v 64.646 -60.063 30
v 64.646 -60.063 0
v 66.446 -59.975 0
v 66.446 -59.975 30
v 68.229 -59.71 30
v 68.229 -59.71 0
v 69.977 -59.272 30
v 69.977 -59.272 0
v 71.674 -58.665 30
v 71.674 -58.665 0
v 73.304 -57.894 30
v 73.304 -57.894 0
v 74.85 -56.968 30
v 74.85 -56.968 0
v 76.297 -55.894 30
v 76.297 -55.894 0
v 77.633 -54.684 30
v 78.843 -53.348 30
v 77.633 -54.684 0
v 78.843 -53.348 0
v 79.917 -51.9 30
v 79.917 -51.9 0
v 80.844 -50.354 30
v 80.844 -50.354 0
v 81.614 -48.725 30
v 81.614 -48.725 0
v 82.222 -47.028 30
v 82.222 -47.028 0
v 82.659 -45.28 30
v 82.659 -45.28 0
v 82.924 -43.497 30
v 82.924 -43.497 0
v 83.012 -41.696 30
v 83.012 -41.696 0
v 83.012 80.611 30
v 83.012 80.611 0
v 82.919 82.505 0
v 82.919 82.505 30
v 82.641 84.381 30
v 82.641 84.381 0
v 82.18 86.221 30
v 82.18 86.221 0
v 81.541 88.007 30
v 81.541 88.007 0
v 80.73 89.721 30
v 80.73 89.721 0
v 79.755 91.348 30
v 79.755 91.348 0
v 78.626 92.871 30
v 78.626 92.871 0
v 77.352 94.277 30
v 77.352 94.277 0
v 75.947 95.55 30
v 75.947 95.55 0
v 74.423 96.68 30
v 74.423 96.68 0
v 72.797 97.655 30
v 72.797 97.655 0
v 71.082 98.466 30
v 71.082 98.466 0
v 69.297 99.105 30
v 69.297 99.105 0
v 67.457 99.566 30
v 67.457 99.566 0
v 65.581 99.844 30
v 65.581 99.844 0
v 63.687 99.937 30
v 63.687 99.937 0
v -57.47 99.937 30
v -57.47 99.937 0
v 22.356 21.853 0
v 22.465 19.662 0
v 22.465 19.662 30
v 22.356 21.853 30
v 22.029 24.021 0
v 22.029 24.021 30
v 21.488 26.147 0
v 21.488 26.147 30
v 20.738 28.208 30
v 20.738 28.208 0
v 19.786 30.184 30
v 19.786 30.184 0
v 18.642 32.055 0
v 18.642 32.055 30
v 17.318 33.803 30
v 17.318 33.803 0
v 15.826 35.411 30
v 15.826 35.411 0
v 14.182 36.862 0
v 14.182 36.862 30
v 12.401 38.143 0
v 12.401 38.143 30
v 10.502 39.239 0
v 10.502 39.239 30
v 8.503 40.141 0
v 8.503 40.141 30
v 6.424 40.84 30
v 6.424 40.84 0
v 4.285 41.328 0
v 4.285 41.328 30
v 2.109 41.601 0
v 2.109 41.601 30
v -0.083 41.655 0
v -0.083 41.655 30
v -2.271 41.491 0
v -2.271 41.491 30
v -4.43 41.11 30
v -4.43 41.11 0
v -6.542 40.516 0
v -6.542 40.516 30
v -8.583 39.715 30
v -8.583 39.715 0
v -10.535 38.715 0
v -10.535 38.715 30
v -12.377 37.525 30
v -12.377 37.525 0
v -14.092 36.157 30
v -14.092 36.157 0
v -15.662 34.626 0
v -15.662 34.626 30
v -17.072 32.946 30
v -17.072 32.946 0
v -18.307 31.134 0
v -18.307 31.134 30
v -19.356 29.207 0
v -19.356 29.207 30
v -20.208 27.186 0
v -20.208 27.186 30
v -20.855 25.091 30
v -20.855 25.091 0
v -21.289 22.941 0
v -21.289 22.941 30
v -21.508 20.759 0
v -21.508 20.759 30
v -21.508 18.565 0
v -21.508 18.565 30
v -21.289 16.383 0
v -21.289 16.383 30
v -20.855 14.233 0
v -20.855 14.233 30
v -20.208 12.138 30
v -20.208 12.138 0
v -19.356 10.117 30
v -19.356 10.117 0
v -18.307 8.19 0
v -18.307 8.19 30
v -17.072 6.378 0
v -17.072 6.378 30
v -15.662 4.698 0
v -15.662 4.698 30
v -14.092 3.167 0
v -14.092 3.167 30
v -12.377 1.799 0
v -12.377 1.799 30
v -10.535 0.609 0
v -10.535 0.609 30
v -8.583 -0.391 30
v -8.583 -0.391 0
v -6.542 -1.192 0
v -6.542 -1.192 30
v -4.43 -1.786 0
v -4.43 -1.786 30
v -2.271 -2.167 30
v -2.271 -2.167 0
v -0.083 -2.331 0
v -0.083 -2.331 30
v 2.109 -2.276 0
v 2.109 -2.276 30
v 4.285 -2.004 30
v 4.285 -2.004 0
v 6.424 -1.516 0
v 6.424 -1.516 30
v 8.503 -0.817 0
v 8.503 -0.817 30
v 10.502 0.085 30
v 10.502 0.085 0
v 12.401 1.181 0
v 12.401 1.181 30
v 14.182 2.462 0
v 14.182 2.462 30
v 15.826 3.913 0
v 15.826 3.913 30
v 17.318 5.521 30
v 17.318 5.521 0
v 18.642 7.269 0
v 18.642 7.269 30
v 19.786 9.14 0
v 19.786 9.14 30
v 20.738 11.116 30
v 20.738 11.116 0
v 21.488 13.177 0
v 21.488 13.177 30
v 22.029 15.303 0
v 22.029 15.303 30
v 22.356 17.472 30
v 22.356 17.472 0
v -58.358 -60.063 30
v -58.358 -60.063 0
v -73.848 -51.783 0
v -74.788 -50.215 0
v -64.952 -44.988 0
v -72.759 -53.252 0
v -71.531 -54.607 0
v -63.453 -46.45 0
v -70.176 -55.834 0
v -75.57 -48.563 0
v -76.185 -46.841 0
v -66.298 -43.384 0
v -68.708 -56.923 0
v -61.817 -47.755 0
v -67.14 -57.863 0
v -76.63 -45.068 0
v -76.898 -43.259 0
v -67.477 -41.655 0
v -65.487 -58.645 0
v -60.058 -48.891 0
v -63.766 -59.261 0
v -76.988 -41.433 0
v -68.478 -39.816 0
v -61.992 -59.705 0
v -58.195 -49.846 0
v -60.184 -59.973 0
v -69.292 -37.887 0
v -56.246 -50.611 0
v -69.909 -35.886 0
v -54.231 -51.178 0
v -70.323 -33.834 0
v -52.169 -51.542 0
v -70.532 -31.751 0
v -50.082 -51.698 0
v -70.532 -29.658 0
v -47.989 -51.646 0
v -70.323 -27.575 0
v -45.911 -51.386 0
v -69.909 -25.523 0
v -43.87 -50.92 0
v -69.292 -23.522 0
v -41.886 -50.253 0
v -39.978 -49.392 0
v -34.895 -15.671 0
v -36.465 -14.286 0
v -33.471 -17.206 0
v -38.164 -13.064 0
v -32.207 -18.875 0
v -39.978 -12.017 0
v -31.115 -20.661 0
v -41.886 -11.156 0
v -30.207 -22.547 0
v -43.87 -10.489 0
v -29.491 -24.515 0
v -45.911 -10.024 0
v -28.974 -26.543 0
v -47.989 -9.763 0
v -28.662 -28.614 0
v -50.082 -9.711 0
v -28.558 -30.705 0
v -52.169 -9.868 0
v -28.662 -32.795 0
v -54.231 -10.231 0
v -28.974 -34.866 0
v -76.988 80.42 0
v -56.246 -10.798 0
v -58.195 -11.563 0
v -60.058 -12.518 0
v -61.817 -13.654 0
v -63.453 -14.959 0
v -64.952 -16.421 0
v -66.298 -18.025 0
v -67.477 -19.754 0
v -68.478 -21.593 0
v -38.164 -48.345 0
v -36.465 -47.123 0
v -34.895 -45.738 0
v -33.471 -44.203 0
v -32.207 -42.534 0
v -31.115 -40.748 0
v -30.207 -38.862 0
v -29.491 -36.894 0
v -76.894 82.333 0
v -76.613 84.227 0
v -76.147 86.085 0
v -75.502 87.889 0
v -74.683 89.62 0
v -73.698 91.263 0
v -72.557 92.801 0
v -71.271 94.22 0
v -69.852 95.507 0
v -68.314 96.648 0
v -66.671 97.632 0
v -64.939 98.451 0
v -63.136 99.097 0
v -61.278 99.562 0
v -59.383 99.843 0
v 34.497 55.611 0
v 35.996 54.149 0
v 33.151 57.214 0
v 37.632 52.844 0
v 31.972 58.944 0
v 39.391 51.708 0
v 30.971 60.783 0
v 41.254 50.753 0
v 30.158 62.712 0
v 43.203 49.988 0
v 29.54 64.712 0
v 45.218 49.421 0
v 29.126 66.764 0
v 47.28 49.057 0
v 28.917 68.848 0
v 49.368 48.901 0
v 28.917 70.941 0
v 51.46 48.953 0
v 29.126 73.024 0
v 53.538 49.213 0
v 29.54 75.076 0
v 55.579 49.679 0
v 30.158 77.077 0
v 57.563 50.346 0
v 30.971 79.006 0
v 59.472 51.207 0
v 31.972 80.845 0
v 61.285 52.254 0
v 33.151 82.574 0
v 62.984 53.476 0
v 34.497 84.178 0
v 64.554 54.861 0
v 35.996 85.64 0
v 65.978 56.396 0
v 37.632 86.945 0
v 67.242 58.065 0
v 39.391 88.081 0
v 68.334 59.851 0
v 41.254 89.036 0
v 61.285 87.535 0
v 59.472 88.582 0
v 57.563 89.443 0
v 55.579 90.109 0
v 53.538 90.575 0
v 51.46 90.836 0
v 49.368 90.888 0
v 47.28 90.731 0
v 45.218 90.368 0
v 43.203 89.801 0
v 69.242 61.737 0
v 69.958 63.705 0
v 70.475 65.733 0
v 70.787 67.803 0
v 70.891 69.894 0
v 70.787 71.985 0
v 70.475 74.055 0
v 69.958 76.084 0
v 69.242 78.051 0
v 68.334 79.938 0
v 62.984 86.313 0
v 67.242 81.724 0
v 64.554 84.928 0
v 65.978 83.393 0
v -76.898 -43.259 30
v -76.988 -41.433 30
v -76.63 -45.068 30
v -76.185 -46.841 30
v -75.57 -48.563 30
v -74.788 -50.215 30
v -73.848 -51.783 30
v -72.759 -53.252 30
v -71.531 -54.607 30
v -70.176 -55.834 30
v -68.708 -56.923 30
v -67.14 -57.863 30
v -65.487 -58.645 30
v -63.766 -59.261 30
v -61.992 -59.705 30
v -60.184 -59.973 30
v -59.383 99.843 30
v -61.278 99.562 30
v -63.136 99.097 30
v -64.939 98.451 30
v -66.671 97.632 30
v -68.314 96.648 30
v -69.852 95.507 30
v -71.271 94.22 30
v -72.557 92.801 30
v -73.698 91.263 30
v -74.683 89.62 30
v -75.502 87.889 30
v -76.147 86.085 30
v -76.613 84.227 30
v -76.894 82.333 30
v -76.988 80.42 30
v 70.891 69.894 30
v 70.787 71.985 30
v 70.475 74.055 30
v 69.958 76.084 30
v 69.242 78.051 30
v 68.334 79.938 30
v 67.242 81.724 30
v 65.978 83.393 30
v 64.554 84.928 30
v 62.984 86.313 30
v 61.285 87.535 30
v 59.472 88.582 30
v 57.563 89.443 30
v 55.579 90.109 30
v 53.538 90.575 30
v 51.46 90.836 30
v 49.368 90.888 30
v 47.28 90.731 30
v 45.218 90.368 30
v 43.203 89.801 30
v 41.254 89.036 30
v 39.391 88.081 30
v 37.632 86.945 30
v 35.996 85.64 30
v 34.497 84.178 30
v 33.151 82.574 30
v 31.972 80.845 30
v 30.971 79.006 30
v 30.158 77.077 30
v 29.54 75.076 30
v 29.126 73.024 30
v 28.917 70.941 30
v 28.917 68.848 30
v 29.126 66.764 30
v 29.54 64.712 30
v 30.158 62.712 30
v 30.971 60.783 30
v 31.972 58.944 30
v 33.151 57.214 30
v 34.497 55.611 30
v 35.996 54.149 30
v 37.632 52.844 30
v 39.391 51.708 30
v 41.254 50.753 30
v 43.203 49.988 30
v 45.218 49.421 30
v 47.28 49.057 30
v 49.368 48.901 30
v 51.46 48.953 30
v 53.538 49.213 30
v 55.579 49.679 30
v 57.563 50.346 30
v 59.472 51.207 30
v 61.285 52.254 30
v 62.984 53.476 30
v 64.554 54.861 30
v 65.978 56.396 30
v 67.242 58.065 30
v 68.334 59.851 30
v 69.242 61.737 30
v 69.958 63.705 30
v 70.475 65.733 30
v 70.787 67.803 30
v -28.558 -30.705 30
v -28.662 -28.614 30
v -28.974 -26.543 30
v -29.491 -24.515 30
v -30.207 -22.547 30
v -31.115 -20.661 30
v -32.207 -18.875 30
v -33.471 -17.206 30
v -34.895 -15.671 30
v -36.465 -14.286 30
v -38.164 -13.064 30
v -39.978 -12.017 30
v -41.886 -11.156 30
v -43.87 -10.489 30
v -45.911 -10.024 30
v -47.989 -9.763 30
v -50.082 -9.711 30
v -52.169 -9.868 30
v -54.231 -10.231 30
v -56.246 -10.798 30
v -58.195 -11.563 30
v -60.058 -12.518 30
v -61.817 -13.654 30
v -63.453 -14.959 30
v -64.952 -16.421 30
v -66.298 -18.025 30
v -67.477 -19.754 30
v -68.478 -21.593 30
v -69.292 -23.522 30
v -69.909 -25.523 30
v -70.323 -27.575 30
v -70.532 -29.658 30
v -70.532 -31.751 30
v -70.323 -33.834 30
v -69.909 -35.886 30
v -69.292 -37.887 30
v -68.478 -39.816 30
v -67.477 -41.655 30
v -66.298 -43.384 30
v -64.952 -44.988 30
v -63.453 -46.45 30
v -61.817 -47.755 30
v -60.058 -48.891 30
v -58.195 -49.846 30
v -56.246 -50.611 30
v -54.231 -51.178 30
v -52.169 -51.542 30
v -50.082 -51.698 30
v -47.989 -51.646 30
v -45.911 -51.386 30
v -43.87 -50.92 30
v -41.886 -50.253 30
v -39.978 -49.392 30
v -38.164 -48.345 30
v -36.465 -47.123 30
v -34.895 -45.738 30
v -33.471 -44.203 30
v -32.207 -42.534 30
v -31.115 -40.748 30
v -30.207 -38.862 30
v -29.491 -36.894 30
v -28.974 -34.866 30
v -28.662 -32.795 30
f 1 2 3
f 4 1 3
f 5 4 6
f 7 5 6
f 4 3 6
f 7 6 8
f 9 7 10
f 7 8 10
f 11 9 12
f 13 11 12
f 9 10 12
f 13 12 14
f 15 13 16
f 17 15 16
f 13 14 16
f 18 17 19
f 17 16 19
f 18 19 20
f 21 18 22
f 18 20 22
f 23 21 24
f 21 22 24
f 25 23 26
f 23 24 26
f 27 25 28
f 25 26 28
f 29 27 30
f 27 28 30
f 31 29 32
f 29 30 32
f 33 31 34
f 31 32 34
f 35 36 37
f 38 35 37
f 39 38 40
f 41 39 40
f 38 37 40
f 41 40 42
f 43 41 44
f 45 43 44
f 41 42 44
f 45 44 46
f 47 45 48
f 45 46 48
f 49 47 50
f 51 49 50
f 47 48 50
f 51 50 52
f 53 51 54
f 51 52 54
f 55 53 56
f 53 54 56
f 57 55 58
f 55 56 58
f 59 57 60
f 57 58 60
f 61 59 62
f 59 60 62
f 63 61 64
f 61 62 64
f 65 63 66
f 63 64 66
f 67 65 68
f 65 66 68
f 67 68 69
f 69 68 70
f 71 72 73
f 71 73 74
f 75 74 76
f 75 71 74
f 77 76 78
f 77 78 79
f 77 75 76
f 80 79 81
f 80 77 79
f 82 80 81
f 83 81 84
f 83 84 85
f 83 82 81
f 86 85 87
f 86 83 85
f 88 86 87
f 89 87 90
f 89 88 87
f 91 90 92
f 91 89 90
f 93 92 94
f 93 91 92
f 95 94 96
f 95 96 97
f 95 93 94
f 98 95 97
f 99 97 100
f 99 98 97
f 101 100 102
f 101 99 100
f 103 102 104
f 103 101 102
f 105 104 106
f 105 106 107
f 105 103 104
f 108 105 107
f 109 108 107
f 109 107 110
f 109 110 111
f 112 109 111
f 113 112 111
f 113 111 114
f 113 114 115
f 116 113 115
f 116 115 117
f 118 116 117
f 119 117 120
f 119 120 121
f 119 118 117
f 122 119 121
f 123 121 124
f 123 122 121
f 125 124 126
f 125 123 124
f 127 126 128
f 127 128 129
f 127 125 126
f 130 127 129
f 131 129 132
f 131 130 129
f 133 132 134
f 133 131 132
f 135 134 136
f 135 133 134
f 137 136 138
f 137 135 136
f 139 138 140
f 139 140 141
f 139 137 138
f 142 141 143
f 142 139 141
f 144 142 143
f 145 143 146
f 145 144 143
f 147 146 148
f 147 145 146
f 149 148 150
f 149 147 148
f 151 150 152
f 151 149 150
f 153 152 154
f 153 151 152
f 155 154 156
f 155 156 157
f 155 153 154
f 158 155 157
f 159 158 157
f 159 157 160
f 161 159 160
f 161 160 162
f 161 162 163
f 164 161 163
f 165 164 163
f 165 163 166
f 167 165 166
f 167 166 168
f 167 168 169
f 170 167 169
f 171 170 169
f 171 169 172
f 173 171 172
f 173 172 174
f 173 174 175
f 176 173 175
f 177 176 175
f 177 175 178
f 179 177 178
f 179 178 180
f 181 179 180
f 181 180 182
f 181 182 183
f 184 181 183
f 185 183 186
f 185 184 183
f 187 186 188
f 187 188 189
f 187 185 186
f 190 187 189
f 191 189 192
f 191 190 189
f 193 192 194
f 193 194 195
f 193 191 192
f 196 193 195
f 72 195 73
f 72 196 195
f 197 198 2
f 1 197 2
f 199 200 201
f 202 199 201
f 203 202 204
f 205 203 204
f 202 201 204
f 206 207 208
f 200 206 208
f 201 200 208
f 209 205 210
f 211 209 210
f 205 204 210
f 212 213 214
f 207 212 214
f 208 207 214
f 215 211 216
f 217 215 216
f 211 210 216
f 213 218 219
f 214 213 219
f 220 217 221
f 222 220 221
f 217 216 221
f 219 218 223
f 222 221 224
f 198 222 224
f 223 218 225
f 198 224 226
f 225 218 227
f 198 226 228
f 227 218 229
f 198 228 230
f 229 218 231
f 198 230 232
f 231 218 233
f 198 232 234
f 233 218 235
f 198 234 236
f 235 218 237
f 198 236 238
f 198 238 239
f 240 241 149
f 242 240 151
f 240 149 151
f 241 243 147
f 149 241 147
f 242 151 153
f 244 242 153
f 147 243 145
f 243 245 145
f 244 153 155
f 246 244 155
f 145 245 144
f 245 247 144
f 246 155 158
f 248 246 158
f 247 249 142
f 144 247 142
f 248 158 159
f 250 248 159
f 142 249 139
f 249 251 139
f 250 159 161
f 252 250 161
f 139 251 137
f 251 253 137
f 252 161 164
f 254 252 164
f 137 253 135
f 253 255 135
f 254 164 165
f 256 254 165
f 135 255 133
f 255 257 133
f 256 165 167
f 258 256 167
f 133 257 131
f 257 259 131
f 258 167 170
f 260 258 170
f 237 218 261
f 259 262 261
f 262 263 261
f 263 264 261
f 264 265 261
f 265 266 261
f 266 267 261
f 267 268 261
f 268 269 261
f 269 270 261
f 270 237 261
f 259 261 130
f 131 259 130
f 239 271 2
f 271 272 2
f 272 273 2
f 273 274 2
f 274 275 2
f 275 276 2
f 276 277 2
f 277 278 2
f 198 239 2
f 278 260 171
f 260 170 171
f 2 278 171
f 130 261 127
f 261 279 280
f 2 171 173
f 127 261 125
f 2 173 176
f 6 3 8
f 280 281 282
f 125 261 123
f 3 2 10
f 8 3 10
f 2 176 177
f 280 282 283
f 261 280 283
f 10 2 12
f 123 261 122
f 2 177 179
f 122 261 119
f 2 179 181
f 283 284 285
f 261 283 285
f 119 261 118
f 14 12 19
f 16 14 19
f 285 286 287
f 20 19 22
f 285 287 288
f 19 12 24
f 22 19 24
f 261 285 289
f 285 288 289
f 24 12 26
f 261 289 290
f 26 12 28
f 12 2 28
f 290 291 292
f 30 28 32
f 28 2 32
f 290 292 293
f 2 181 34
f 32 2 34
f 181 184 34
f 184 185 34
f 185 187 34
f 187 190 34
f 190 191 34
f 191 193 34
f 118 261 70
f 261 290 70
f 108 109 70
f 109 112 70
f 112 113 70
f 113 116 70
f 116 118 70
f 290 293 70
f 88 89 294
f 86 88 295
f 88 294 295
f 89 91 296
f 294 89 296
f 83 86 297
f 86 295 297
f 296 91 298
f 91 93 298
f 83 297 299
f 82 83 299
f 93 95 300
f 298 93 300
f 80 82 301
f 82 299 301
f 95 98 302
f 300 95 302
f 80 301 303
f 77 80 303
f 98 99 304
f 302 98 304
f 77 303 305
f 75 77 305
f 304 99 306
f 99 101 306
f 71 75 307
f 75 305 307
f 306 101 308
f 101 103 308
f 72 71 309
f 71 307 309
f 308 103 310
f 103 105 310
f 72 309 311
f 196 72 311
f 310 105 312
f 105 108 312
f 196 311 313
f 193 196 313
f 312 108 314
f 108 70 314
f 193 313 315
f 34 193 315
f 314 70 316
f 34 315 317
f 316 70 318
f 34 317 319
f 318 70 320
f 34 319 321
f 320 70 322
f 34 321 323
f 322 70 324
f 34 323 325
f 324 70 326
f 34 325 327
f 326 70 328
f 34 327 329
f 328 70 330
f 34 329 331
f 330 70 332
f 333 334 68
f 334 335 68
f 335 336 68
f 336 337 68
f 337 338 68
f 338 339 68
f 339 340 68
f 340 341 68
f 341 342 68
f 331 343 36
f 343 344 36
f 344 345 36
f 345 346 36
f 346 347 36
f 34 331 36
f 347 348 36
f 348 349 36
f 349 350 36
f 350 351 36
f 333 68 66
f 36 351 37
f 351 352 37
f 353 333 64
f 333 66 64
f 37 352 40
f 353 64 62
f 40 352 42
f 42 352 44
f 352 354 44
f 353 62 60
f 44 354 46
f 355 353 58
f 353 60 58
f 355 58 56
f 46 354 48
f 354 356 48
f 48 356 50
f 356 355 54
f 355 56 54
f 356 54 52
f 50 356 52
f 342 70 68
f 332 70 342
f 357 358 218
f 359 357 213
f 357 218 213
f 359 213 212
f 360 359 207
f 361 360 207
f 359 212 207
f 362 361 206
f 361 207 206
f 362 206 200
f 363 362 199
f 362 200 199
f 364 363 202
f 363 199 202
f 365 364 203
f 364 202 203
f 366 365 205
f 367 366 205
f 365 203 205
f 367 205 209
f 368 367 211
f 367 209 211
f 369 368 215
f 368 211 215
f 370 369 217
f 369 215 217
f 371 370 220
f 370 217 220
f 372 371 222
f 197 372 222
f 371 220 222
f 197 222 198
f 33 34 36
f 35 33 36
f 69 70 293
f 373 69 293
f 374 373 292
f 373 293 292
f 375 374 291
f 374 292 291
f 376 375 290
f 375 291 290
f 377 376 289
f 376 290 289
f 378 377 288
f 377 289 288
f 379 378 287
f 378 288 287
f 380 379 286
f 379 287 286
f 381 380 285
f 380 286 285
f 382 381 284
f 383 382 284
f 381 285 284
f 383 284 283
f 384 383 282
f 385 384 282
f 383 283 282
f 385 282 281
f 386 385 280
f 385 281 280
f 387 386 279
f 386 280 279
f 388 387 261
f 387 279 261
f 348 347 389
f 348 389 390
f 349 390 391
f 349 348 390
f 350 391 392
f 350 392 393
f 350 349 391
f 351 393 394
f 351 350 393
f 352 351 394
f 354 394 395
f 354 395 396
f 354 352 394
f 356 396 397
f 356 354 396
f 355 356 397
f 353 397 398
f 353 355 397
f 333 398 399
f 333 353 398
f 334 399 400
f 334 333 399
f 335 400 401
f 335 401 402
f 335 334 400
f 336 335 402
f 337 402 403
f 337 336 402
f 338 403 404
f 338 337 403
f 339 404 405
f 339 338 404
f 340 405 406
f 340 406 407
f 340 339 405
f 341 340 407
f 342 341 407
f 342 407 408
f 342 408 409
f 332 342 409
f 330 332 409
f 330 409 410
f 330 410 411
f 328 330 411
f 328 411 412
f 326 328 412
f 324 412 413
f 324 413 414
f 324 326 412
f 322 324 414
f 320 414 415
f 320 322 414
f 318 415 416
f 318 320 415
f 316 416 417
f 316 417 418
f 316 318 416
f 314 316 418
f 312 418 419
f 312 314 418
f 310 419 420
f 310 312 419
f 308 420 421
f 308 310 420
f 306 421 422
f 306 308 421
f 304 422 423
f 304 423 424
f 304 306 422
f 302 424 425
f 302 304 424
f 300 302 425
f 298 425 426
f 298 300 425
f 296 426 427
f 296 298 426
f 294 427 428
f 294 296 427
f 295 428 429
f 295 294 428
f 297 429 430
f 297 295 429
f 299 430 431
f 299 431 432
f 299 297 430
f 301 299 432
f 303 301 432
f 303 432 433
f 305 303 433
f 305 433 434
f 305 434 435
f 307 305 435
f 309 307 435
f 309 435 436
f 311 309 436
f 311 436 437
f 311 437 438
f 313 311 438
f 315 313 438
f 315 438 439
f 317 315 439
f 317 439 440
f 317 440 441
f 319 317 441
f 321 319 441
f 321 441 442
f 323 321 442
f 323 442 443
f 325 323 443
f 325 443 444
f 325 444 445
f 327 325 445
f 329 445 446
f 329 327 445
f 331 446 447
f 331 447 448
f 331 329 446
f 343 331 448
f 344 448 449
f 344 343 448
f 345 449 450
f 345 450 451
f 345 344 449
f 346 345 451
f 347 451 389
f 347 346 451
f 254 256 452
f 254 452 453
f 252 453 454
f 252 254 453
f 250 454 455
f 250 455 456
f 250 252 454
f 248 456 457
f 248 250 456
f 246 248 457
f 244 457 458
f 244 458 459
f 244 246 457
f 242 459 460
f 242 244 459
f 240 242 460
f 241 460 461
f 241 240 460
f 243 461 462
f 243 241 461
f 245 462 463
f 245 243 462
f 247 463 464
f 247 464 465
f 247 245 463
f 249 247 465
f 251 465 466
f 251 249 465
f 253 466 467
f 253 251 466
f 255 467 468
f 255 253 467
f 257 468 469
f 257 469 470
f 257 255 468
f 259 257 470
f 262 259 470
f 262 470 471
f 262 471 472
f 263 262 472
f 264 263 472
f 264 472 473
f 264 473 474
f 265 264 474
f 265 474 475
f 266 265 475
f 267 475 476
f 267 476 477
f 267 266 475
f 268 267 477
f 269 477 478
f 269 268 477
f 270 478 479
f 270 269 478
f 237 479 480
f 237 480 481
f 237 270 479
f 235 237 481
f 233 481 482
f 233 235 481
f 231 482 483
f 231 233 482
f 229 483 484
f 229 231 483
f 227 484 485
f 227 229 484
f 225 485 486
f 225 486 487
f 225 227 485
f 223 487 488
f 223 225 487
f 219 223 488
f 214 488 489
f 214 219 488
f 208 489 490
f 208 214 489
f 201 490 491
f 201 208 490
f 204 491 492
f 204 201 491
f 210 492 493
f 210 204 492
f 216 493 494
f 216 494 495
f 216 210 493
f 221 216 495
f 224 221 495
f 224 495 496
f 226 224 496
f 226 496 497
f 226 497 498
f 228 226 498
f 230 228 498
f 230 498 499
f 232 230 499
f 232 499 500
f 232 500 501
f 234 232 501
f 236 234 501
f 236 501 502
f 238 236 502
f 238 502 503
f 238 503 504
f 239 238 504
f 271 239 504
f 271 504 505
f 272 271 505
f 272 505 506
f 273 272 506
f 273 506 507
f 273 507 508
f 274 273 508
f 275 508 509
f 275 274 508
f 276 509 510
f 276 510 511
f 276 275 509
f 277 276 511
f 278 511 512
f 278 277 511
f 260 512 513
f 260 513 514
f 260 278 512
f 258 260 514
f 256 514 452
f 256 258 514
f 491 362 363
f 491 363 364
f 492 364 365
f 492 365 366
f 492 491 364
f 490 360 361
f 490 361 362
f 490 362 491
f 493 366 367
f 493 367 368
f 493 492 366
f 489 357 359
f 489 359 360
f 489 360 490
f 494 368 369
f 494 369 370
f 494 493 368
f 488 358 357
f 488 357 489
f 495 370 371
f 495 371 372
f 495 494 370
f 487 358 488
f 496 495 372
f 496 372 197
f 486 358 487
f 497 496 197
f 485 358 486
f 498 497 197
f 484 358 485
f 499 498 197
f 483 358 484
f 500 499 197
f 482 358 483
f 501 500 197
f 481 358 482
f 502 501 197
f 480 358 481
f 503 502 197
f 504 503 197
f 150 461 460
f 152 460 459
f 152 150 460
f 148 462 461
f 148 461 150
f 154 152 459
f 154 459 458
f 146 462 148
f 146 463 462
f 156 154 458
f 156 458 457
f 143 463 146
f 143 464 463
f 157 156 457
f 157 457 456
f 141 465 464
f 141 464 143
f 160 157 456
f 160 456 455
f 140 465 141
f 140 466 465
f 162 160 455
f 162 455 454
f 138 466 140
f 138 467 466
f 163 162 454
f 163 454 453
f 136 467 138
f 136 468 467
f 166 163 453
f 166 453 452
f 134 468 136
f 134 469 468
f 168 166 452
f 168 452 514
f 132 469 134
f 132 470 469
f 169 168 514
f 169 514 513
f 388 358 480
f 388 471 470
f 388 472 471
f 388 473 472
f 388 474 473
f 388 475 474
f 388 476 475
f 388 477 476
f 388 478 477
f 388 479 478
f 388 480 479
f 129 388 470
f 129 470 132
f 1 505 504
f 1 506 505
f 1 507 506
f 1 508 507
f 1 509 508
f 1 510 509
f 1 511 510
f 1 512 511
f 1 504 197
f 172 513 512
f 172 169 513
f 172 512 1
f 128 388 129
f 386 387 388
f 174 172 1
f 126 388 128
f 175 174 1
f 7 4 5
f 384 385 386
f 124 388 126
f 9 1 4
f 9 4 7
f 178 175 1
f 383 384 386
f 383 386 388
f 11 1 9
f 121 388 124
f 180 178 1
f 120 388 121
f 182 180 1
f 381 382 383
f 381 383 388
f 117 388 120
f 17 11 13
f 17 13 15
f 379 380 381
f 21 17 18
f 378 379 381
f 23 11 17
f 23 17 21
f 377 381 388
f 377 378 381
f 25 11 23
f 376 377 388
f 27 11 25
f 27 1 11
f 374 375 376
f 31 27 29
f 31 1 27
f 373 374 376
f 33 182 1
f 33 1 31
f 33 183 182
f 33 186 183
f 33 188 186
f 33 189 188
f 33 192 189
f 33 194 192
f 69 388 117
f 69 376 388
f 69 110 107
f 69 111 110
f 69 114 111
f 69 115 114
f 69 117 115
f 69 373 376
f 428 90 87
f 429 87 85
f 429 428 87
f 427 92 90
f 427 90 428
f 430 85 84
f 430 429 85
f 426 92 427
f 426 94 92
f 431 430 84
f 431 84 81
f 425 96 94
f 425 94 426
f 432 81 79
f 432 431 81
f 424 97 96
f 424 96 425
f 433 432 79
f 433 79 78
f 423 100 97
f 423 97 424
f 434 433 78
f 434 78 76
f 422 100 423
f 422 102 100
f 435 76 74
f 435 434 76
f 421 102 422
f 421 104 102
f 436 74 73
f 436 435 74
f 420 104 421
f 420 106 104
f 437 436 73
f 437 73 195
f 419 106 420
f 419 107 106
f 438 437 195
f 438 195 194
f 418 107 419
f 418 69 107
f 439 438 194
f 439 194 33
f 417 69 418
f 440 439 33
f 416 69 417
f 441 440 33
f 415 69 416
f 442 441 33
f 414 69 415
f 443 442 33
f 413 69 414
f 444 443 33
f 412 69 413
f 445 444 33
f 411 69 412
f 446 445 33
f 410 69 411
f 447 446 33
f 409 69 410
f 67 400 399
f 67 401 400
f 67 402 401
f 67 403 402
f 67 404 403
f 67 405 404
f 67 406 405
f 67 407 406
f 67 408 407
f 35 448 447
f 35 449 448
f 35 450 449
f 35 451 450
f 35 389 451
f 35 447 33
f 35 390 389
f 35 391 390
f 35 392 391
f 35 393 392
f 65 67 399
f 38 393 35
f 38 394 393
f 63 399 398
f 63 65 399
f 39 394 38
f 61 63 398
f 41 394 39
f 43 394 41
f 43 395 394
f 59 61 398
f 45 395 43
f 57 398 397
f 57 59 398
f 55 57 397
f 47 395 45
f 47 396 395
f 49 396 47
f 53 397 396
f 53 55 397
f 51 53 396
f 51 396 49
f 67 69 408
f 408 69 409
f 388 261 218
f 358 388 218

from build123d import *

# Parameters (mm, degrees)
SKETCH_R   = 21
SKETCH_R_2 = 22
PAD_DEPTH  = 30


with BuildPart() as part:
    # Sketch → Pad (new body)
    with BuildSketch(Plane.XY):
        with BuildLine():
            Line((-58.357879, -60.063078), (64.645731, -60.063078))
            ThreePointArc((64.645731, -60.063078), (77.632902, -54.683615), (83.012364, -41.696445))
            Line((83.012364, -41.696445), (83.012364, 80.611165))
            ThreePointArc((83.012364, 80.611165), (77.351981, 94.276539), (63.686607, 99.936922))
            Line((63.686607, 99.936922), (-57.470352, 99.936922))
            ThreePointArc((-57.470352, 99.936922), (-71.271156, 94.220442), (-76.987636, 80.419638))
            Line((-76.987636, 80.419638), (-76.987636, -41.433321))
            ThreePointArc((-76.987636, -41.433321), (-71.531106, -54.606548), (-58.357879, -60.063078))
        make_face()
        with Locations((-49.557964, -30.704547)):
            Circle(SKETCH_R, mode=Mode.SUBTRACT)
        with Locations((49.891115, 69.894362)):
            Circle(SKETCH_R, mode=Mode.SUBTRACT)
        with Locations((0.465053, 19.662022)):
            Circle(SKETCH_R_2, mode=Mode.SUBTRACT)
    extrude(amount=PAD_DEPTH)


solid = part.part
